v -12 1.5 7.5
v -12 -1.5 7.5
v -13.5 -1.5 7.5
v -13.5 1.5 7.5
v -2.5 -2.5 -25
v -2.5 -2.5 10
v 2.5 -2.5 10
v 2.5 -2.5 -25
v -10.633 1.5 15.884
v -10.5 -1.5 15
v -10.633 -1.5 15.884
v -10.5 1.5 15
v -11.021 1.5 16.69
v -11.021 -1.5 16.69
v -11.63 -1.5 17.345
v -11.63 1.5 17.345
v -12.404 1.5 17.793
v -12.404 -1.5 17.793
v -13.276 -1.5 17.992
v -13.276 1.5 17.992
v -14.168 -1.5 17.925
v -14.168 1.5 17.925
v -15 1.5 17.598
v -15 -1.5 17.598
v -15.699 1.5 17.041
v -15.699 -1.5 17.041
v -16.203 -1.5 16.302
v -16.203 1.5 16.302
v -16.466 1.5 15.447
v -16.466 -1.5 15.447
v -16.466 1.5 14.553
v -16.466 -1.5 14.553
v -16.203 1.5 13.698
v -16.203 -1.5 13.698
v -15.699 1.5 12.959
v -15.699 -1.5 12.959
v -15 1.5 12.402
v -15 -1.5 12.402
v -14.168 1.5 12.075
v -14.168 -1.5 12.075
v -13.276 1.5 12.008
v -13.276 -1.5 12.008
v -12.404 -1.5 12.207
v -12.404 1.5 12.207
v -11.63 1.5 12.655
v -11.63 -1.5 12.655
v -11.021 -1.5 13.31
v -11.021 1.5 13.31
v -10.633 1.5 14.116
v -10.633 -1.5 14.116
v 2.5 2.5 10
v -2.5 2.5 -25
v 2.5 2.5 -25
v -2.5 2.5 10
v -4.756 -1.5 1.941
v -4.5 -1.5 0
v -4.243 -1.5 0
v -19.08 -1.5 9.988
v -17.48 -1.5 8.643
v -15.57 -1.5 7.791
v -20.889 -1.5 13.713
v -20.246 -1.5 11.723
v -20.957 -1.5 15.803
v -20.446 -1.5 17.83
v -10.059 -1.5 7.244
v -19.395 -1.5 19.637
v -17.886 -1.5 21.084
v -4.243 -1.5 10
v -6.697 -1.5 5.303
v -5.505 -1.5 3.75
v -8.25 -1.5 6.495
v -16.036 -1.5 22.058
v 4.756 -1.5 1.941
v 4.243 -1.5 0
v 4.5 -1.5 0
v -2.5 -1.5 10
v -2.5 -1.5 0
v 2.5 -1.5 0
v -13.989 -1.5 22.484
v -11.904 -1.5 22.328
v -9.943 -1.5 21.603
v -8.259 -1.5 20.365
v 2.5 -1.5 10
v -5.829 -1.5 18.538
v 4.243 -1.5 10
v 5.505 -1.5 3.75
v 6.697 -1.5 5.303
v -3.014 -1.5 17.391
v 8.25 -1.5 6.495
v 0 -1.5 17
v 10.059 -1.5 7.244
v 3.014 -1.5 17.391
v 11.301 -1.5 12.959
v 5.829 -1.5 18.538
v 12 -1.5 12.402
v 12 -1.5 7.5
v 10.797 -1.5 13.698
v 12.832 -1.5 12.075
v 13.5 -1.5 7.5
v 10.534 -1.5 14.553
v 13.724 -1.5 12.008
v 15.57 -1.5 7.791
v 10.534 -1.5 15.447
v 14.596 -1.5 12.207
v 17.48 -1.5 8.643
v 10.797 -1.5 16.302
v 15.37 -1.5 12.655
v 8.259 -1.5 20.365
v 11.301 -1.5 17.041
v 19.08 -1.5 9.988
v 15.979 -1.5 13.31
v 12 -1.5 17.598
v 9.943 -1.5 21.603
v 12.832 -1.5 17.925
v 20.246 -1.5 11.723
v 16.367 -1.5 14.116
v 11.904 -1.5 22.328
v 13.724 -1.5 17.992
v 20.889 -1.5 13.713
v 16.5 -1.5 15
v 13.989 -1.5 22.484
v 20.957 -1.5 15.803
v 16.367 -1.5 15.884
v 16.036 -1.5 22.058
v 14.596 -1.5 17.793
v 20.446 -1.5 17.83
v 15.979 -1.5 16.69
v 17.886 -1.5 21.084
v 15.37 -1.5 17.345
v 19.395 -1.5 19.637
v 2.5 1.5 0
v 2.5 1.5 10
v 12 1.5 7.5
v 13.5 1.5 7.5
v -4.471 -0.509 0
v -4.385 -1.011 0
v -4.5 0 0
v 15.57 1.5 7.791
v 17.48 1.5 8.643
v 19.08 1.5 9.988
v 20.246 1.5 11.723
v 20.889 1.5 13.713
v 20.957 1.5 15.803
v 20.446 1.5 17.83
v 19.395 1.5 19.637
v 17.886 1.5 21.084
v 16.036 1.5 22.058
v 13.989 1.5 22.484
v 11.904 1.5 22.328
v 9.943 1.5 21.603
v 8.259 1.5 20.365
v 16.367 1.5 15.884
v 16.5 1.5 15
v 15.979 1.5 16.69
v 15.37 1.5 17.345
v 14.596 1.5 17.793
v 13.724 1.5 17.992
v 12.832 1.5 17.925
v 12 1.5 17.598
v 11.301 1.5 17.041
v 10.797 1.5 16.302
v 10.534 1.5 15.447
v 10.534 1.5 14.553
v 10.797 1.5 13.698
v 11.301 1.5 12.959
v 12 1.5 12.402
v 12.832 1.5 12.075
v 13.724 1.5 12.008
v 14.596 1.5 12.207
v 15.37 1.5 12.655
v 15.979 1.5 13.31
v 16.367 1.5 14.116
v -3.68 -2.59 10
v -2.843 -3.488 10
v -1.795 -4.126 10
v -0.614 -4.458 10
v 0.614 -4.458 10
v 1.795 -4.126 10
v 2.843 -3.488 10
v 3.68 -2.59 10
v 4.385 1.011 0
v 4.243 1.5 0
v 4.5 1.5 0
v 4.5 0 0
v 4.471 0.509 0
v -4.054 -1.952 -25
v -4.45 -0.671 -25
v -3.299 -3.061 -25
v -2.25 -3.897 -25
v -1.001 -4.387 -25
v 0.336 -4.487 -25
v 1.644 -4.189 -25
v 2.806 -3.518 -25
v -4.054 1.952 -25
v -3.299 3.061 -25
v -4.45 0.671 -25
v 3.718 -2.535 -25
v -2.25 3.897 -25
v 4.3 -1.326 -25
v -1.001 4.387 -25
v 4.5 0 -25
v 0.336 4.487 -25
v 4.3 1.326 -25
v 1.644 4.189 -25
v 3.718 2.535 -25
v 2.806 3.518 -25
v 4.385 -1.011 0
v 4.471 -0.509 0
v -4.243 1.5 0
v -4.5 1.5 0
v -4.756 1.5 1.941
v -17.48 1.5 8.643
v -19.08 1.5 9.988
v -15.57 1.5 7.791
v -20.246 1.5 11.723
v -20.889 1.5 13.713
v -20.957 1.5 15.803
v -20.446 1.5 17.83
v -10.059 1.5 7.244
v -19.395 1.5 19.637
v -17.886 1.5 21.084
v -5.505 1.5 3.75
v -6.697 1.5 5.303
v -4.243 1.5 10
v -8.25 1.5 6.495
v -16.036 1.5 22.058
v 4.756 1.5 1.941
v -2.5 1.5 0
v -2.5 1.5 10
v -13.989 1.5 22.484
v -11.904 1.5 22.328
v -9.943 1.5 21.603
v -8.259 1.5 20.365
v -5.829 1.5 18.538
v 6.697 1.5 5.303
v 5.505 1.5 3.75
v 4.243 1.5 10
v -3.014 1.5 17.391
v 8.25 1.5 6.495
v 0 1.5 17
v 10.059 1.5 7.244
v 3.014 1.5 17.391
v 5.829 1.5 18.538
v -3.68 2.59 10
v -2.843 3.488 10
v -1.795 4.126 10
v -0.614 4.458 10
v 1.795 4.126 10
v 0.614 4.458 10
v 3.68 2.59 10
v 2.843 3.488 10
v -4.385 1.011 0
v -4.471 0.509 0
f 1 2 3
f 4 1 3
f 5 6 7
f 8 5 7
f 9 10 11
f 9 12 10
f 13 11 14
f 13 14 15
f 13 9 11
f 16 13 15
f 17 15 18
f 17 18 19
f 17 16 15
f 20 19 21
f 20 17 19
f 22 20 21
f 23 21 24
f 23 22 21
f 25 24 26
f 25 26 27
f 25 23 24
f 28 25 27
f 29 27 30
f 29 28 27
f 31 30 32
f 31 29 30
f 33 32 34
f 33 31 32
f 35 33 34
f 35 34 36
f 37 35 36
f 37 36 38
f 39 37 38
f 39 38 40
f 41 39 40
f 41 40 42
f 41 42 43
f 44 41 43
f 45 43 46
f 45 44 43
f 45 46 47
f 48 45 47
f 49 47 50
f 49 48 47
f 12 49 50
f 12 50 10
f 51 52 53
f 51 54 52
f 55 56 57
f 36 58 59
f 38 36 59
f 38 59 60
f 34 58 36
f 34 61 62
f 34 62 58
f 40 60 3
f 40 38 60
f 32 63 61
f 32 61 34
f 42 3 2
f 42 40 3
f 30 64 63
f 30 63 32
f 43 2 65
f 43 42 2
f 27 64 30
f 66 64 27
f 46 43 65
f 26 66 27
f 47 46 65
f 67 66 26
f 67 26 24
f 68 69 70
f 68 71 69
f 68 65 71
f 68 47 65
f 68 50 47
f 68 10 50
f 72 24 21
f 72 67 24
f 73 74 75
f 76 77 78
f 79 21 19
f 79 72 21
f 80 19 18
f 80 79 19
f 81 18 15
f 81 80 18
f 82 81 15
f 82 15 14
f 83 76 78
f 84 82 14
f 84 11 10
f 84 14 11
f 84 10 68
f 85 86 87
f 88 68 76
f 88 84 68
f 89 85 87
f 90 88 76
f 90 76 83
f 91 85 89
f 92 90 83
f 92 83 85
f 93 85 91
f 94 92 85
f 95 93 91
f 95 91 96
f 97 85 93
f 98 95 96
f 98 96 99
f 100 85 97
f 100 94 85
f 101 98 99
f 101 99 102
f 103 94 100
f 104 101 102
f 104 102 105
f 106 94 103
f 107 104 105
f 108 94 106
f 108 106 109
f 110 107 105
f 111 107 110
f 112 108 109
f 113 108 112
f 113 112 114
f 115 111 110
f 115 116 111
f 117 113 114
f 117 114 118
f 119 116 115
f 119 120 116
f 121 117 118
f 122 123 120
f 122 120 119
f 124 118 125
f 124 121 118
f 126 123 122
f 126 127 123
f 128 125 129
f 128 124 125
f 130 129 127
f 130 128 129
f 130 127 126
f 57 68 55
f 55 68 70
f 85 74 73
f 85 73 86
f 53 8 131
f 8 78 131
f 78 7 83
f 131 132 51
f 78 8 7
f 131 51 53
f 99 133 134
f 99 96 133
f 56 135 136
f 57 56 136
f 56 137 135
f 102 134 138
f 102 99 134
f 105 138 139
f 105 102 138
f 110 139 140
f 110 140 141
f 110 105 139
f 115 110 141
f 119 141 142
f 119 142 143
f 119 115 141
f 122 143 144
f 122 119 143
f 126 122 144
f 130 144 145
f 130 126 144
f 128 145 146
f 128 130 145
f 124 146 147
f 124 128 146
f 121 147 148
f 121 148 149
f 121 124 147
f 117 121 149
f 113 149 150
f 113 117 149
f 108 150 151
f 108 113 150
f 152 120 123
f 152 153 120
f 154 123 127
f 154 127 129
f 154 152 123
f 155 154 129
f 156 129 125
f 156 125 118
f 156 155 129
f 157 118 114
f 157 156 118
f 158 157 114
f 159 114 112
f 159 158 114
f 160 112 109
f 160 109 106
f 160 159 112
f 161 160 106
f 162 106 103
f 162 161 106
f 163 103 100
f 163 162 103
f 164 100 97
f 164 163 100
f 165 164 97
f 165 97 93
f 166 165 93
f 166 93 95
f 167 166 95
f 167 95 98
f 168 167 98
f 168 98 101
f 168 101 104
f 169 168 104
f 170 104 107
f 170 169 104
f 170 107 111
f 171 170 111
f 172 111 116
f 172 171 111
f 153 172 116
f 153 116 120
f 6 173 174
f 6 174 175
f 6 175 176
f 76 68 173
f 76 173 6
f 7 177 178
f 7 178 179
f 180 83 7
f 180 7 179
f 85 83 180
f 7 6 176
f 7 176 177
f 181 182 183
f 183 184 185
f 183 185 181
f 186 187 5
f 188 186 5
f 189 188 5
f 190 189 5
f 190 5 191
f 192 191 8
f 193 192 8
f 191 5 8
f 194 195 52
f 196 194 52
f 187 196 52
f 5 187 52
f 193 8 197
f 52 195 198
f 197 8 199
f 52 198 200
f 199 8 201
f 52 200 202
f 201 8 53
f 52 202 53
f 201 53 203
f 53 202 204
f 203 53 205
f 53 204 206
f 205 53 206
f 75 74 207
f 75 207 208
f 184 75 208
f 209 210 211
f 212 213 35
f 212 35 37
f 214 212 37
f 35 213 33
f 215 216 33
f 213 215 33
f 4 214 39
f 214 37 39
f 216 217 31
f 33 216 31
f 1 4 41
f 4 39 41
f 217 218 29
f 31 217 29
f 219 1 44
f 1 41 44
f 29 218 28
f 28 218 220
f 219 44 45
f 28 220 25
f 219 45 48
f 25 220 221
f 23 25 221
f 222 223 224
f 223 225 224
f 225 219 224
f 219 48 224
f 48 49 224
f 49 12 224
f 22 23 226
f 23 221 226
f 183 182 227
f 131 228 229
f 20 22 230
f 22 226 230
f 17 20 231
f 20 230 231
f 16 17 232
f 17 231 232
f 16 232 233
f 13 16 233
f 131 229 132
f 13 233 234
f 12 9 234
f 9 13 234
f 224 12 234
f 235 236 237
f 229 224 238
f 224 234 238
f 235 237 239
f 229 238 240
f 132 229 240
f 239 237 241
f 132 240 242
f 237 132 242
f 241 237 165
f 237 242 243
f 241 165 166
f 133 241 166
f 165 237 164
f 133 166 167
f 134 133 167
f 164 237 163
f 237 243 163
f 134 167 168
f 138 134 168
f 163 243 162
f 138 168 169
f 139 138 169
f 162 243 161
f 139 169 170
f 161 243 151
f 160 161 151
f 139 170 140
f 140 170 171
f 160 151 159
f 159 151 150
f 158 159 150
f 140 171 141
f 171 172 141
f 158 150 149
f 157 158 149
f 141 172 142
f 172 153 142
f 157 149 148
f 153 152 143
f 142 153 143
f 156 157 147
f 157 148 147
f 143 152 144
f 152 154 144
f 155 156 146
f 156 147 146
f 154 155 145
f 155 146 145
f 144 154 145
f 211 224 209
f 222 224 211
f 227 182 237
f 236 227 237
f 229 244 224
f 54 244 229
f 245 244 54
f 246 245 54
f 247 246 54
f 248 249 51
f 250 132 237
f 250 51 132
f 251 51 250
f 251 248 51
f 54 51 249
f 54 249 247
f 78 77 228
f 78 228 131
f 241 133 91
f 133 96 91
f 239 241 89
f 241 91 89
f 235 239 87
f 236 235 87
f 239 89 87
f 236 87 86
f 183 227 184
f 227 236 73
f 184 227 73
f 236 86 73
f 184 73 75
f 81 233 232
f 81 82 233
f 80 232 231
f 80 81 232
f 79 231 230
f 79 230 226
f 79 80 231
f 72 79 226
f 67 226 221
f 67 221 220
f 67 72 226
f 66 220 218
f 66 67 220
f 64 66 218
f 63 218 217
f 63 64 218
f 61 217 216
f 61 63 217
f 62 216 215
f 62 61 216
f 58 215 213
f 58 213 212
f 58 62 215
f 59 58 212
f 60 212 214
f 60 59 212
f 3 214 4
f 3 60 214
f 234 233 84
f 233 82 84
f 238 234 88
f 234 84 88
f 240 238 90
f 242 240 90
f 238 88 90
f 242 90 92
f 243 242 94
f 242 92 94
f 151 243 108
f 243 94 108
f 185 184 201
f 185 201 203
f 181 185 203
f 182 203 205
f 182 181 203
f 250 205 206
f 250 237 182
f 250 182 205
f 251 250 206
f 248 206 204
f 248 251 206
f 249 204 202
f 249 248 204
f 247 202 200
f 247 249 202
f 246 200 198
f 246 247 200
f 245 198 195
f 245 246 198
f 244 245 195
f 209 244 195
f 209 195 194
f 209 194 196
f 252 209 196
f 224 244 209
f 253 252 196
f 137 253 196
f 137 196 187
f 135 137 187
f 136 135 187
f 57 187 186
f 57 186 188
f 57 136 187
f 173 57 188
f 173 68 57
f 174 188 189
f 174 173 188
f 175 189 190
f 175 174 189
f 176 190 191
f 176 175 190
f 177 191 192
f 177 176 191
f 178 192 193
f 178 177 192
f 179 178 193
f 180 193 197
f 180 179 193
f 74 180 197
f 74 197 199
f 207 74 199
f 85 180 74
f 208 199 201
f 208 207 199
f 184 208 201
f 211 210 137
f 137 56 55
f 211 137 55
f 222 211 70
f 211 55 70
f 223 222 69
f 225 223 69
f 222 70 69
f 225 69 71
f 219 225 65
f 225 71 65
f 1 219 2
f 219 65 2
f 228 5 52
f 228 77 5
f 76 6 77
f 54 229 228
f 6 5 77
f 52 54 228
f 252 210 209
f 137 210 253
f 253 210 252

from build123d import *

# Parameters (mm, degrees)
SKETCH_R       = 4.5
SKETCH_W       = 5
SKETCH_H       = 5
PAD_DEPTH      = 10
PAD_DEPTH_BACK = 25
SKETCH001_R    = 3
PAD001_DEPTH   = 1.5


with BuildPart() as part:
    # Sketch → Pad (new body, two sides)
    with BuildSketch(Plane.XY) as pad_sk:
        Circle(SKETCH_R)
        Rectangle(SKETCH_W, SKETCH_H, mode=Mode.SUBTRACT)
    extrude(amount=PAD_DEPTH)
    extrude(pad_sk.sketch, amount=-PAD_DEPTH_BACK)

    # Sketch001 → Pad001 (join, symmetric)
    with BuildSketch(Plane.XZ):
        with BuildLine():
            ThreePointArc((-8.258824, 20.364706), (-20.445693, 17.829727), (-13.5, 7.5))
            Line((-12, 7.5), (-13.5, 7.5))
            ThreePointArc((-4.5, 0), (-6.696699, 5.303301), (-12, 7.5))
            Line((-4.5, 0), (4.5, 0))
            ThreePointArc((12, 7.5), (6.696699, 5.303301), (4.5, 0))
            Line((12, 7.5), (13.5, 7.5))
            ThreePointArc((13.5, 7.5), (20.445693, 17.829727), (8.258824, 20.364706))
            ThreePointArc((-8.258824, 20.364706), (0, 17), (8.258824, 20.364706))
        make_face()
        with Locations((13.5, 15)):
            Circle(SKETCH001_R, mode=Mode.SUBTRACT)
        with Locations((-13.5, 15)):
            Circle(SKETCH001_R, mode=Mode.SUBTRACT)
    extrude(amount=PAD001_DEPTH, both=True)


solid = part.part
